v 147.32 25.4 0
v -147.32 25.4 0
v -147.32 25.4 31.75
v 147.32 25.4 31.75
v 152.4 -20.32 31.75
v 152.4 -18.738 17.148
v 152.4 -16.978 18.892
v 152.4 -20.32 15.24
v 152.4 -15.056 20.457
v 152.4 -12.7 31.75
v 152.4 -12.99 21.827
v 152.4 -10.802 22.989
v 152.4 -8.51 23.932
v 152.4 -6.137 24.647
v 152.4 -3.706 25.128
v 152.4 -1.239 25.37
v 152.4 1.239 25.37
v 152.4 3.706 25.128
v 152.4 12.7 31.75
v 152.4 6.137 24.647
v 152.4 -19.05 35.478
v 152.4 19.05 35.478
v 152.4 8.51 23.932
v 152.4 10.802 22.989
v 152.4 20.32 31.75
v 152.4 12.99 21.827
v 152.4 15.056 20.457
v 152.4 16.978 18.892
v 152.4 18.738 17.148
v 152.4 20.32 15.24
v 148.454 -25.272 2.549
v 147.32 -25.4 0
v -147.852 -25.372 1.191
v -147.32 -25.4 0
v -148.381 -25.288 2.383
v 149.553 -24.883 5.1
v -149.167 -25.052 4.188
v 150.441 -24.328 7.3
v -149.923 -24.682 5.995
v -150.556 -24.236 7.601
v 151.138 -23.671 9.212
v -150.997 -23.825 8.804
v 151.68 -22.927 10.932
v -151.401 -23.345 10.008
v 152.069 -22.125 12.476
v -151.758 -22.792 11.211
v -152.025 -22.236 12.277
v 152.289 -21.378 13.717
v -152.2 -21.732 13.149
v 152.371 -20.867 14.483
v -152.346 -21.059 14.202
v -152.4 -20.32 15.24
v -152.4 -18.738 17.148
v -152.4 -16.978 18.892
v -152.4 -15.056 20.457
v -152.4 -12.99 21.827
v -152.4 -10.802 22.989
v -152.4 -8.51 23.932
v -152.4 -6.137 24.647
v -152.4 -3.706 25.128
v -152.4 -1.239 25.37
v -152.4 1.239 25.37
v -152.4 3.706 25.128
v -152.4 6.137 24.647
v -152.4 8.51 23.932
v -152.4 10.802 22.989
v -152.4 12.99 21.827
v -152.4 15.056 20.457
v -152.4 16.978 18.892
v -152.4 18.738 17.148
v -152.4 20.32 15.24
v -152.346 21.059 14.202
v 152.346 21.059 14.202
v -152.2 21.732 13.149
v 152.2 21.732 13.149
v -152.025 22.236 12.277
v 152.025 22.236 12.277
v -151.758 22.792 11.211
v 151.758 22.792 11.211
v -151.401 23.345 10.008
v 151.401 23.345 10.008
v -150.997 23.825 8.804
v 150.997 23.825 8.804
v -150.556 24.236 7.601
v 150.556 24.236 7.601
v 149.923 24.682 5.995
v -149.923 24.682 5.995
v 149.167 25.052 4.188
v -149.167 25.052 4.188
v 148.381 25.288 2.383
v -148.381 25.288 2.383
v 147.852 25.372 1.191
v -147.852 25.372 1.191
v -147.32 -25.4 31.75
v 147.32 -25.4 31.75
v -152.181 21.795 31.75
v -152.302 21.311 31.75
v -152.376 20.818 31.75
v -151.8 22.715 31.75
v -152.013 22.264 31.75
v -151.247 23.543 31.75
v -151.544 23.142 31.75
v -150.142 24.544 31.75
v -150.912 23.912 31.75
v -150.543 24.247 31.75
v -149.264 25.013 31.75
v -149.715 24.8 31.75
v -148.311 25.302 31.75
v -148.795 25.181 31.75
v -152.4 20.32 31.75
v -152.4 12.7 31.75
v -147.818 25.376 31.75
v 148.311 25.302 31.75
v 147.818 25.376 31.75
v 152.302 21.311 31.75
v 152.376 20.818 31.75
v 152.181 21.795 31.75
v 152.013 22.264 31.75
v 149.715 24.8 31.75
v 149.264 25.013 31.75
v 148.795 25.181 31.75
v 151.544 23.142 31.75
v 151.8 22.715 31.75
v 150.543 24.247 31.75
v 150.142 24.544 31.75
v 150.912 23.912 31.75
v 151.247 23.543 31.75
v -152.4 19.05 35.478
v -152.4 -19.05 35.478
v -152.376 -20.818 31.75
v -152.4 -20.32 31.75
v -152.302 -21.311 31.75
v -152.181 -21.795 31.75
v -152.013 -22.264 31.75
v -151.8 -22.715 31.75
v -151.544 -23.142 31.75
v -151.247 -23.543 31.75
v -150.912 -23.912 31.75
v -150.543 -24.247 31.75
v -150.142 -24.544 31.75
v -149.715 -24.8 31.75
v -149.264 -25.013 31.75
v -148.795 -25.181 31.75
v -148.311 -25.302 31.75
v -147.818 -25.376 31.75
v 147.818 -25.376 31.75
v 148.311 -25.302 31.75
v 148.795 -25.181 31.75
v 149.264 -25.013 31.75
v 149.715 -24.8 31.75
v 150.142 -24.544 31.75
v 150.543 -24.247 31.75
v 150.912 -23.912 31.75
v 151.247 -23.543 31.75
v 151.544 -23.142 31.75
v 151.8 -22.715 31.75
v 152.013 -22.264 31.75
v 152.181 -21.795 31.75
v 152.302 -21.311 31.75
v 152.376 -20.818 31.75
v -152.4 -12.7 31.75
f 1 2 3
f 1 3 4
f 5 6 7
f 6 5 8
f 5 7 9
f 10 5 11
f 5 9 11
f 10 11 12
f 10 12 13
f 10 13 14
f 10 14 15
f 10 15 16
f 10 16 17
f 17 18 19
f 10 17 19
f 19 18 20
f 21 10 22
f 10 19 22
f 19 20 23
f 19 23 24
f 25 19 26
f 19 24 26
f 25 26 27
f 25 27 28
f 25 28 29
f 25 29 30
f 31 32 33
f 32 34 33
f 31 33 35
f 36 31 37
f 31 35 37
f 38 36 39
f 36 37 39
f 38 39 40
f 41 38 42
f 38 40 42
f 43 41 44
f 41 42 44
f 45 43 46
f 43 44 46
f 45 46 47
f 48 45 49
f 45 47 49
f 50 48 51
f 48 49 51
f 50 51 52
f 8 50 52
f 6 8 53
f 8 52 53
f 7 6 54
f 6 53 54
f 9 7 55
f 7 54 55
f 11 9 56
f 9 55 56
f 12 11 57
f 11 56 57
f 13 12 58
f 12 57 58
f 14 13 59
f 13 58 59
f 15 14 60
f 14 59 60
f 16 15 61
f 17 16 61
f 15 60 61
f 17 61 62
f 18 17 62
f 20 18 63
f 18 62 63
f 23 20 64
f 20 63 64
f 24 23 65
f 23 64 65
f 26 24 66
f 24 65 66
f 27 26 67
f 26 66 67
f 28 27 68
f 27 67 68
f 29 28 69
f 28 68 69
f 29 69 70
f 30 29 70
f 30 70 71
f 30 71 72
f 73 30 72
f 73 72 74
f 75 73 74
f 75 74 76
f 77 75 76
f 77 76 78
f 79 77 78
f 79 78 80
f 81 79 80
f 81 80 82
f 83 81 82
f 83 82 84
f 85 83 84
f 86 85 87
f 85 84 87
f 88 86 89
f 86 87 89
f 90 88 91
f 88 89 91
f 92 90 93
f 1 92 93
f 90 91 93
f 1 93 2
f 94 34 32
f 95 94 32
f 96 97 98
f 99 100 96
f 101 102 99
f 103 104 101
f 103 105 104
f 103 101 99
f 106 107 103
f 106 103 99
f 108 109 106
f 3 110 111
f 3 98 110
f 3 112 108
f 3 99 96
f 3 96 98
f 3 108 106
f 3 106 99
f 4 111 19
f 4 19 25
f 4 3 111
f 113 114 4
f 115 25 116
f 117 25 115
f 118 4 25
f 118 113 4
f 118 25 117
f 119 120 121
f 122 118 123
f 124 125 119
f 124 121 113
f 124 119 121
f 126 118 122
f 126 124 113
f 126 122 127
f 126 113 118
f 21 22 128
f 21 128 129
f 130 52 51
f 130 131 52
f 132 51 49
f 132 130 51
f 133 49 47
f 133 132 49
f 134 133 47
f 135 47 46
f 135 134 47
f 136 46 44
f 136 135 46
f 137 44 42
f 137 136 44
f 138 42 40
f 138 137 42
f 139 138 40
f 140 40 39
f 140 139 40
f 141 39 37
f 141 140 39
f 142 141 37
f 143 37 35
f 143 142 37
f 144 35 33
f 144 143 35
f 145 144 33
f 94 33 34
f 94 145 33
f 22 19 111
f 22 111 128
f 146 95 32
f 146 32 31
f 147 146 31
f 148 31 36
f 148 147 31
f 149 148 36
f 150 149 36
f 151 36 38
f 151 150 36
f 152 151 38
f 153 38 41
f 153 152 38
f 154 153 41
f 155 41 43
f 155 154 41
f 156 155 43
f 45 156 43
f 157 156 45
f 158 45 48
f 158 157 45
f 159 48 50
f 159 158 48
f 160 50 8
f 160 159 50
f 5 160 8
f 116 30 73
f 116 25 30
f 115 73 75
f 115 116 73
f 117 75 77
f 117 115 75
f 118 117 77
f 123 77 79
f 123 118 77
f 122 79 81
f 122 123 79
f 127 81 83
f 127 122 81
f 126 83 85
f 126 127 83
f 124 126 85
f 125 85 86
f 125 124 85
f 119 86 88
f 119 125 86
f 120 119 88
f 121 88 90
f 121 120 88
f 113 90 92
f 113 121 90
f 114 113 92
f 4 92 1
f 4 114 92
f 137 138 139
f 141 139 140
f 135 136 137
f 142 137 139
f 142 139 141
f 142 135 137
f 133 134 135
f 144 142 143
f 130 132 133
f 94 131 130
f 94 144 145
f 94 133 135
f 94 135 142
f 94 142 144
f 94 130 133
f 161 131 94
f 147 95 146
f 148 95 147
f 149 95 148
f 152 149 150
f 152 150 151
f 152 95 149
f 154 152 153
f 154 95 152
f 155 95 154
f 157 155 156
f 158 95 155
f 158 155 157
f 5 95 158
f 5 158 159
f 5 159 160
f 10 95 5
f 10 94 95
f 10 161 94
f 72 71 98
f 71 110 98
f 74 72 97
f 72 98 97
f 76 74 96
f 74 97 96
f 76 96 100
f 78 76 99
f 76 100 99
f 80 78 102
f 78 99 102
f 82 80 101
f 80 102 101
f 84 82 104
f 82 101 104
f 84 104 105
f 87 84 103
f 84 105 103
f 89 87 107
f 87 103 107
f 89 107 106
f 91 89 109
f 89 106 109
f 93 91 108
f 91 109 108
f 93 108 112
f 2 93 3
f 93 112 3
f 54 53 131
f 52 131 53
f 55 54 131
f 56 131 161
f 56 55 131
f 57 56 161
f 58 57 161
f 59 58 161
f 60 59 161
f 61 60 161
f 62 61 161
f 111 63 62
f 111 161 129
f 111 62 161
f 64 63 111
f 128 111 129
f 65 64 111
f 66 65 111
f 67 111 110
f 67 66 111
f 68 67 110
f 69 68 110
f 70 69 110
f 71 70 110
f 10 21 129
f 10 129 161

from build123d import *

# Parameters (mm, degrees)
F0_W     = 304.8
F0_H     = 50.8
F1_DEPTH = 31.75
F2_R     = 5.08
F4_DEPTH = 304.801
F6_DEPTH = 304.8


with BuildPart() as f1:
    # F0 (on Top) → F1 (new body)
    with BuildSketch(Plane.XY):
        Rectangle(F0_W, F0_H)
    extrude(amount=F1_DEPTH)

    # F2
    f2_edges = [f1.edges().sort_by_distance(p)[0] for p in [
        (-152.4, 25.4, 15.875),
        (-152.4, -25.4, 15.875),
        (152.4, 25.4, 15.875),
        (152.4, -25.4, 15.875),
    ]]
    fillet(f2_edges, radius=F2_R)

    # F3 (on face) → F4 (cut, through all)
    with BuildSketch(Plane(origin=(-152.4, 0, 0), x_dir=(0, -1, 0), z_dir=(-1, 0, 0))):
        with BuildLine():
            Line((-25.4, 0), (25.4, 0))
            ThreePointArc((25.4, 0), (0, 25.4), (-25.4, 0))
        make_face()
    extrude(amount=-F4_DEPTH, mode=Mode.SUBTRACT)

    # F5 (on face) → F6 (join, through all)
    with BuildSketch(Plane.YZ.offset(152.4)):
        Polygon((-12.7, 31.75), (0, 31.75), (12.7, 31.75), (19.05, 35.478412), (-19.05, 35.478412), align=None)
    extrude(amount=-F6_DEPTH)


solid = f1.part
